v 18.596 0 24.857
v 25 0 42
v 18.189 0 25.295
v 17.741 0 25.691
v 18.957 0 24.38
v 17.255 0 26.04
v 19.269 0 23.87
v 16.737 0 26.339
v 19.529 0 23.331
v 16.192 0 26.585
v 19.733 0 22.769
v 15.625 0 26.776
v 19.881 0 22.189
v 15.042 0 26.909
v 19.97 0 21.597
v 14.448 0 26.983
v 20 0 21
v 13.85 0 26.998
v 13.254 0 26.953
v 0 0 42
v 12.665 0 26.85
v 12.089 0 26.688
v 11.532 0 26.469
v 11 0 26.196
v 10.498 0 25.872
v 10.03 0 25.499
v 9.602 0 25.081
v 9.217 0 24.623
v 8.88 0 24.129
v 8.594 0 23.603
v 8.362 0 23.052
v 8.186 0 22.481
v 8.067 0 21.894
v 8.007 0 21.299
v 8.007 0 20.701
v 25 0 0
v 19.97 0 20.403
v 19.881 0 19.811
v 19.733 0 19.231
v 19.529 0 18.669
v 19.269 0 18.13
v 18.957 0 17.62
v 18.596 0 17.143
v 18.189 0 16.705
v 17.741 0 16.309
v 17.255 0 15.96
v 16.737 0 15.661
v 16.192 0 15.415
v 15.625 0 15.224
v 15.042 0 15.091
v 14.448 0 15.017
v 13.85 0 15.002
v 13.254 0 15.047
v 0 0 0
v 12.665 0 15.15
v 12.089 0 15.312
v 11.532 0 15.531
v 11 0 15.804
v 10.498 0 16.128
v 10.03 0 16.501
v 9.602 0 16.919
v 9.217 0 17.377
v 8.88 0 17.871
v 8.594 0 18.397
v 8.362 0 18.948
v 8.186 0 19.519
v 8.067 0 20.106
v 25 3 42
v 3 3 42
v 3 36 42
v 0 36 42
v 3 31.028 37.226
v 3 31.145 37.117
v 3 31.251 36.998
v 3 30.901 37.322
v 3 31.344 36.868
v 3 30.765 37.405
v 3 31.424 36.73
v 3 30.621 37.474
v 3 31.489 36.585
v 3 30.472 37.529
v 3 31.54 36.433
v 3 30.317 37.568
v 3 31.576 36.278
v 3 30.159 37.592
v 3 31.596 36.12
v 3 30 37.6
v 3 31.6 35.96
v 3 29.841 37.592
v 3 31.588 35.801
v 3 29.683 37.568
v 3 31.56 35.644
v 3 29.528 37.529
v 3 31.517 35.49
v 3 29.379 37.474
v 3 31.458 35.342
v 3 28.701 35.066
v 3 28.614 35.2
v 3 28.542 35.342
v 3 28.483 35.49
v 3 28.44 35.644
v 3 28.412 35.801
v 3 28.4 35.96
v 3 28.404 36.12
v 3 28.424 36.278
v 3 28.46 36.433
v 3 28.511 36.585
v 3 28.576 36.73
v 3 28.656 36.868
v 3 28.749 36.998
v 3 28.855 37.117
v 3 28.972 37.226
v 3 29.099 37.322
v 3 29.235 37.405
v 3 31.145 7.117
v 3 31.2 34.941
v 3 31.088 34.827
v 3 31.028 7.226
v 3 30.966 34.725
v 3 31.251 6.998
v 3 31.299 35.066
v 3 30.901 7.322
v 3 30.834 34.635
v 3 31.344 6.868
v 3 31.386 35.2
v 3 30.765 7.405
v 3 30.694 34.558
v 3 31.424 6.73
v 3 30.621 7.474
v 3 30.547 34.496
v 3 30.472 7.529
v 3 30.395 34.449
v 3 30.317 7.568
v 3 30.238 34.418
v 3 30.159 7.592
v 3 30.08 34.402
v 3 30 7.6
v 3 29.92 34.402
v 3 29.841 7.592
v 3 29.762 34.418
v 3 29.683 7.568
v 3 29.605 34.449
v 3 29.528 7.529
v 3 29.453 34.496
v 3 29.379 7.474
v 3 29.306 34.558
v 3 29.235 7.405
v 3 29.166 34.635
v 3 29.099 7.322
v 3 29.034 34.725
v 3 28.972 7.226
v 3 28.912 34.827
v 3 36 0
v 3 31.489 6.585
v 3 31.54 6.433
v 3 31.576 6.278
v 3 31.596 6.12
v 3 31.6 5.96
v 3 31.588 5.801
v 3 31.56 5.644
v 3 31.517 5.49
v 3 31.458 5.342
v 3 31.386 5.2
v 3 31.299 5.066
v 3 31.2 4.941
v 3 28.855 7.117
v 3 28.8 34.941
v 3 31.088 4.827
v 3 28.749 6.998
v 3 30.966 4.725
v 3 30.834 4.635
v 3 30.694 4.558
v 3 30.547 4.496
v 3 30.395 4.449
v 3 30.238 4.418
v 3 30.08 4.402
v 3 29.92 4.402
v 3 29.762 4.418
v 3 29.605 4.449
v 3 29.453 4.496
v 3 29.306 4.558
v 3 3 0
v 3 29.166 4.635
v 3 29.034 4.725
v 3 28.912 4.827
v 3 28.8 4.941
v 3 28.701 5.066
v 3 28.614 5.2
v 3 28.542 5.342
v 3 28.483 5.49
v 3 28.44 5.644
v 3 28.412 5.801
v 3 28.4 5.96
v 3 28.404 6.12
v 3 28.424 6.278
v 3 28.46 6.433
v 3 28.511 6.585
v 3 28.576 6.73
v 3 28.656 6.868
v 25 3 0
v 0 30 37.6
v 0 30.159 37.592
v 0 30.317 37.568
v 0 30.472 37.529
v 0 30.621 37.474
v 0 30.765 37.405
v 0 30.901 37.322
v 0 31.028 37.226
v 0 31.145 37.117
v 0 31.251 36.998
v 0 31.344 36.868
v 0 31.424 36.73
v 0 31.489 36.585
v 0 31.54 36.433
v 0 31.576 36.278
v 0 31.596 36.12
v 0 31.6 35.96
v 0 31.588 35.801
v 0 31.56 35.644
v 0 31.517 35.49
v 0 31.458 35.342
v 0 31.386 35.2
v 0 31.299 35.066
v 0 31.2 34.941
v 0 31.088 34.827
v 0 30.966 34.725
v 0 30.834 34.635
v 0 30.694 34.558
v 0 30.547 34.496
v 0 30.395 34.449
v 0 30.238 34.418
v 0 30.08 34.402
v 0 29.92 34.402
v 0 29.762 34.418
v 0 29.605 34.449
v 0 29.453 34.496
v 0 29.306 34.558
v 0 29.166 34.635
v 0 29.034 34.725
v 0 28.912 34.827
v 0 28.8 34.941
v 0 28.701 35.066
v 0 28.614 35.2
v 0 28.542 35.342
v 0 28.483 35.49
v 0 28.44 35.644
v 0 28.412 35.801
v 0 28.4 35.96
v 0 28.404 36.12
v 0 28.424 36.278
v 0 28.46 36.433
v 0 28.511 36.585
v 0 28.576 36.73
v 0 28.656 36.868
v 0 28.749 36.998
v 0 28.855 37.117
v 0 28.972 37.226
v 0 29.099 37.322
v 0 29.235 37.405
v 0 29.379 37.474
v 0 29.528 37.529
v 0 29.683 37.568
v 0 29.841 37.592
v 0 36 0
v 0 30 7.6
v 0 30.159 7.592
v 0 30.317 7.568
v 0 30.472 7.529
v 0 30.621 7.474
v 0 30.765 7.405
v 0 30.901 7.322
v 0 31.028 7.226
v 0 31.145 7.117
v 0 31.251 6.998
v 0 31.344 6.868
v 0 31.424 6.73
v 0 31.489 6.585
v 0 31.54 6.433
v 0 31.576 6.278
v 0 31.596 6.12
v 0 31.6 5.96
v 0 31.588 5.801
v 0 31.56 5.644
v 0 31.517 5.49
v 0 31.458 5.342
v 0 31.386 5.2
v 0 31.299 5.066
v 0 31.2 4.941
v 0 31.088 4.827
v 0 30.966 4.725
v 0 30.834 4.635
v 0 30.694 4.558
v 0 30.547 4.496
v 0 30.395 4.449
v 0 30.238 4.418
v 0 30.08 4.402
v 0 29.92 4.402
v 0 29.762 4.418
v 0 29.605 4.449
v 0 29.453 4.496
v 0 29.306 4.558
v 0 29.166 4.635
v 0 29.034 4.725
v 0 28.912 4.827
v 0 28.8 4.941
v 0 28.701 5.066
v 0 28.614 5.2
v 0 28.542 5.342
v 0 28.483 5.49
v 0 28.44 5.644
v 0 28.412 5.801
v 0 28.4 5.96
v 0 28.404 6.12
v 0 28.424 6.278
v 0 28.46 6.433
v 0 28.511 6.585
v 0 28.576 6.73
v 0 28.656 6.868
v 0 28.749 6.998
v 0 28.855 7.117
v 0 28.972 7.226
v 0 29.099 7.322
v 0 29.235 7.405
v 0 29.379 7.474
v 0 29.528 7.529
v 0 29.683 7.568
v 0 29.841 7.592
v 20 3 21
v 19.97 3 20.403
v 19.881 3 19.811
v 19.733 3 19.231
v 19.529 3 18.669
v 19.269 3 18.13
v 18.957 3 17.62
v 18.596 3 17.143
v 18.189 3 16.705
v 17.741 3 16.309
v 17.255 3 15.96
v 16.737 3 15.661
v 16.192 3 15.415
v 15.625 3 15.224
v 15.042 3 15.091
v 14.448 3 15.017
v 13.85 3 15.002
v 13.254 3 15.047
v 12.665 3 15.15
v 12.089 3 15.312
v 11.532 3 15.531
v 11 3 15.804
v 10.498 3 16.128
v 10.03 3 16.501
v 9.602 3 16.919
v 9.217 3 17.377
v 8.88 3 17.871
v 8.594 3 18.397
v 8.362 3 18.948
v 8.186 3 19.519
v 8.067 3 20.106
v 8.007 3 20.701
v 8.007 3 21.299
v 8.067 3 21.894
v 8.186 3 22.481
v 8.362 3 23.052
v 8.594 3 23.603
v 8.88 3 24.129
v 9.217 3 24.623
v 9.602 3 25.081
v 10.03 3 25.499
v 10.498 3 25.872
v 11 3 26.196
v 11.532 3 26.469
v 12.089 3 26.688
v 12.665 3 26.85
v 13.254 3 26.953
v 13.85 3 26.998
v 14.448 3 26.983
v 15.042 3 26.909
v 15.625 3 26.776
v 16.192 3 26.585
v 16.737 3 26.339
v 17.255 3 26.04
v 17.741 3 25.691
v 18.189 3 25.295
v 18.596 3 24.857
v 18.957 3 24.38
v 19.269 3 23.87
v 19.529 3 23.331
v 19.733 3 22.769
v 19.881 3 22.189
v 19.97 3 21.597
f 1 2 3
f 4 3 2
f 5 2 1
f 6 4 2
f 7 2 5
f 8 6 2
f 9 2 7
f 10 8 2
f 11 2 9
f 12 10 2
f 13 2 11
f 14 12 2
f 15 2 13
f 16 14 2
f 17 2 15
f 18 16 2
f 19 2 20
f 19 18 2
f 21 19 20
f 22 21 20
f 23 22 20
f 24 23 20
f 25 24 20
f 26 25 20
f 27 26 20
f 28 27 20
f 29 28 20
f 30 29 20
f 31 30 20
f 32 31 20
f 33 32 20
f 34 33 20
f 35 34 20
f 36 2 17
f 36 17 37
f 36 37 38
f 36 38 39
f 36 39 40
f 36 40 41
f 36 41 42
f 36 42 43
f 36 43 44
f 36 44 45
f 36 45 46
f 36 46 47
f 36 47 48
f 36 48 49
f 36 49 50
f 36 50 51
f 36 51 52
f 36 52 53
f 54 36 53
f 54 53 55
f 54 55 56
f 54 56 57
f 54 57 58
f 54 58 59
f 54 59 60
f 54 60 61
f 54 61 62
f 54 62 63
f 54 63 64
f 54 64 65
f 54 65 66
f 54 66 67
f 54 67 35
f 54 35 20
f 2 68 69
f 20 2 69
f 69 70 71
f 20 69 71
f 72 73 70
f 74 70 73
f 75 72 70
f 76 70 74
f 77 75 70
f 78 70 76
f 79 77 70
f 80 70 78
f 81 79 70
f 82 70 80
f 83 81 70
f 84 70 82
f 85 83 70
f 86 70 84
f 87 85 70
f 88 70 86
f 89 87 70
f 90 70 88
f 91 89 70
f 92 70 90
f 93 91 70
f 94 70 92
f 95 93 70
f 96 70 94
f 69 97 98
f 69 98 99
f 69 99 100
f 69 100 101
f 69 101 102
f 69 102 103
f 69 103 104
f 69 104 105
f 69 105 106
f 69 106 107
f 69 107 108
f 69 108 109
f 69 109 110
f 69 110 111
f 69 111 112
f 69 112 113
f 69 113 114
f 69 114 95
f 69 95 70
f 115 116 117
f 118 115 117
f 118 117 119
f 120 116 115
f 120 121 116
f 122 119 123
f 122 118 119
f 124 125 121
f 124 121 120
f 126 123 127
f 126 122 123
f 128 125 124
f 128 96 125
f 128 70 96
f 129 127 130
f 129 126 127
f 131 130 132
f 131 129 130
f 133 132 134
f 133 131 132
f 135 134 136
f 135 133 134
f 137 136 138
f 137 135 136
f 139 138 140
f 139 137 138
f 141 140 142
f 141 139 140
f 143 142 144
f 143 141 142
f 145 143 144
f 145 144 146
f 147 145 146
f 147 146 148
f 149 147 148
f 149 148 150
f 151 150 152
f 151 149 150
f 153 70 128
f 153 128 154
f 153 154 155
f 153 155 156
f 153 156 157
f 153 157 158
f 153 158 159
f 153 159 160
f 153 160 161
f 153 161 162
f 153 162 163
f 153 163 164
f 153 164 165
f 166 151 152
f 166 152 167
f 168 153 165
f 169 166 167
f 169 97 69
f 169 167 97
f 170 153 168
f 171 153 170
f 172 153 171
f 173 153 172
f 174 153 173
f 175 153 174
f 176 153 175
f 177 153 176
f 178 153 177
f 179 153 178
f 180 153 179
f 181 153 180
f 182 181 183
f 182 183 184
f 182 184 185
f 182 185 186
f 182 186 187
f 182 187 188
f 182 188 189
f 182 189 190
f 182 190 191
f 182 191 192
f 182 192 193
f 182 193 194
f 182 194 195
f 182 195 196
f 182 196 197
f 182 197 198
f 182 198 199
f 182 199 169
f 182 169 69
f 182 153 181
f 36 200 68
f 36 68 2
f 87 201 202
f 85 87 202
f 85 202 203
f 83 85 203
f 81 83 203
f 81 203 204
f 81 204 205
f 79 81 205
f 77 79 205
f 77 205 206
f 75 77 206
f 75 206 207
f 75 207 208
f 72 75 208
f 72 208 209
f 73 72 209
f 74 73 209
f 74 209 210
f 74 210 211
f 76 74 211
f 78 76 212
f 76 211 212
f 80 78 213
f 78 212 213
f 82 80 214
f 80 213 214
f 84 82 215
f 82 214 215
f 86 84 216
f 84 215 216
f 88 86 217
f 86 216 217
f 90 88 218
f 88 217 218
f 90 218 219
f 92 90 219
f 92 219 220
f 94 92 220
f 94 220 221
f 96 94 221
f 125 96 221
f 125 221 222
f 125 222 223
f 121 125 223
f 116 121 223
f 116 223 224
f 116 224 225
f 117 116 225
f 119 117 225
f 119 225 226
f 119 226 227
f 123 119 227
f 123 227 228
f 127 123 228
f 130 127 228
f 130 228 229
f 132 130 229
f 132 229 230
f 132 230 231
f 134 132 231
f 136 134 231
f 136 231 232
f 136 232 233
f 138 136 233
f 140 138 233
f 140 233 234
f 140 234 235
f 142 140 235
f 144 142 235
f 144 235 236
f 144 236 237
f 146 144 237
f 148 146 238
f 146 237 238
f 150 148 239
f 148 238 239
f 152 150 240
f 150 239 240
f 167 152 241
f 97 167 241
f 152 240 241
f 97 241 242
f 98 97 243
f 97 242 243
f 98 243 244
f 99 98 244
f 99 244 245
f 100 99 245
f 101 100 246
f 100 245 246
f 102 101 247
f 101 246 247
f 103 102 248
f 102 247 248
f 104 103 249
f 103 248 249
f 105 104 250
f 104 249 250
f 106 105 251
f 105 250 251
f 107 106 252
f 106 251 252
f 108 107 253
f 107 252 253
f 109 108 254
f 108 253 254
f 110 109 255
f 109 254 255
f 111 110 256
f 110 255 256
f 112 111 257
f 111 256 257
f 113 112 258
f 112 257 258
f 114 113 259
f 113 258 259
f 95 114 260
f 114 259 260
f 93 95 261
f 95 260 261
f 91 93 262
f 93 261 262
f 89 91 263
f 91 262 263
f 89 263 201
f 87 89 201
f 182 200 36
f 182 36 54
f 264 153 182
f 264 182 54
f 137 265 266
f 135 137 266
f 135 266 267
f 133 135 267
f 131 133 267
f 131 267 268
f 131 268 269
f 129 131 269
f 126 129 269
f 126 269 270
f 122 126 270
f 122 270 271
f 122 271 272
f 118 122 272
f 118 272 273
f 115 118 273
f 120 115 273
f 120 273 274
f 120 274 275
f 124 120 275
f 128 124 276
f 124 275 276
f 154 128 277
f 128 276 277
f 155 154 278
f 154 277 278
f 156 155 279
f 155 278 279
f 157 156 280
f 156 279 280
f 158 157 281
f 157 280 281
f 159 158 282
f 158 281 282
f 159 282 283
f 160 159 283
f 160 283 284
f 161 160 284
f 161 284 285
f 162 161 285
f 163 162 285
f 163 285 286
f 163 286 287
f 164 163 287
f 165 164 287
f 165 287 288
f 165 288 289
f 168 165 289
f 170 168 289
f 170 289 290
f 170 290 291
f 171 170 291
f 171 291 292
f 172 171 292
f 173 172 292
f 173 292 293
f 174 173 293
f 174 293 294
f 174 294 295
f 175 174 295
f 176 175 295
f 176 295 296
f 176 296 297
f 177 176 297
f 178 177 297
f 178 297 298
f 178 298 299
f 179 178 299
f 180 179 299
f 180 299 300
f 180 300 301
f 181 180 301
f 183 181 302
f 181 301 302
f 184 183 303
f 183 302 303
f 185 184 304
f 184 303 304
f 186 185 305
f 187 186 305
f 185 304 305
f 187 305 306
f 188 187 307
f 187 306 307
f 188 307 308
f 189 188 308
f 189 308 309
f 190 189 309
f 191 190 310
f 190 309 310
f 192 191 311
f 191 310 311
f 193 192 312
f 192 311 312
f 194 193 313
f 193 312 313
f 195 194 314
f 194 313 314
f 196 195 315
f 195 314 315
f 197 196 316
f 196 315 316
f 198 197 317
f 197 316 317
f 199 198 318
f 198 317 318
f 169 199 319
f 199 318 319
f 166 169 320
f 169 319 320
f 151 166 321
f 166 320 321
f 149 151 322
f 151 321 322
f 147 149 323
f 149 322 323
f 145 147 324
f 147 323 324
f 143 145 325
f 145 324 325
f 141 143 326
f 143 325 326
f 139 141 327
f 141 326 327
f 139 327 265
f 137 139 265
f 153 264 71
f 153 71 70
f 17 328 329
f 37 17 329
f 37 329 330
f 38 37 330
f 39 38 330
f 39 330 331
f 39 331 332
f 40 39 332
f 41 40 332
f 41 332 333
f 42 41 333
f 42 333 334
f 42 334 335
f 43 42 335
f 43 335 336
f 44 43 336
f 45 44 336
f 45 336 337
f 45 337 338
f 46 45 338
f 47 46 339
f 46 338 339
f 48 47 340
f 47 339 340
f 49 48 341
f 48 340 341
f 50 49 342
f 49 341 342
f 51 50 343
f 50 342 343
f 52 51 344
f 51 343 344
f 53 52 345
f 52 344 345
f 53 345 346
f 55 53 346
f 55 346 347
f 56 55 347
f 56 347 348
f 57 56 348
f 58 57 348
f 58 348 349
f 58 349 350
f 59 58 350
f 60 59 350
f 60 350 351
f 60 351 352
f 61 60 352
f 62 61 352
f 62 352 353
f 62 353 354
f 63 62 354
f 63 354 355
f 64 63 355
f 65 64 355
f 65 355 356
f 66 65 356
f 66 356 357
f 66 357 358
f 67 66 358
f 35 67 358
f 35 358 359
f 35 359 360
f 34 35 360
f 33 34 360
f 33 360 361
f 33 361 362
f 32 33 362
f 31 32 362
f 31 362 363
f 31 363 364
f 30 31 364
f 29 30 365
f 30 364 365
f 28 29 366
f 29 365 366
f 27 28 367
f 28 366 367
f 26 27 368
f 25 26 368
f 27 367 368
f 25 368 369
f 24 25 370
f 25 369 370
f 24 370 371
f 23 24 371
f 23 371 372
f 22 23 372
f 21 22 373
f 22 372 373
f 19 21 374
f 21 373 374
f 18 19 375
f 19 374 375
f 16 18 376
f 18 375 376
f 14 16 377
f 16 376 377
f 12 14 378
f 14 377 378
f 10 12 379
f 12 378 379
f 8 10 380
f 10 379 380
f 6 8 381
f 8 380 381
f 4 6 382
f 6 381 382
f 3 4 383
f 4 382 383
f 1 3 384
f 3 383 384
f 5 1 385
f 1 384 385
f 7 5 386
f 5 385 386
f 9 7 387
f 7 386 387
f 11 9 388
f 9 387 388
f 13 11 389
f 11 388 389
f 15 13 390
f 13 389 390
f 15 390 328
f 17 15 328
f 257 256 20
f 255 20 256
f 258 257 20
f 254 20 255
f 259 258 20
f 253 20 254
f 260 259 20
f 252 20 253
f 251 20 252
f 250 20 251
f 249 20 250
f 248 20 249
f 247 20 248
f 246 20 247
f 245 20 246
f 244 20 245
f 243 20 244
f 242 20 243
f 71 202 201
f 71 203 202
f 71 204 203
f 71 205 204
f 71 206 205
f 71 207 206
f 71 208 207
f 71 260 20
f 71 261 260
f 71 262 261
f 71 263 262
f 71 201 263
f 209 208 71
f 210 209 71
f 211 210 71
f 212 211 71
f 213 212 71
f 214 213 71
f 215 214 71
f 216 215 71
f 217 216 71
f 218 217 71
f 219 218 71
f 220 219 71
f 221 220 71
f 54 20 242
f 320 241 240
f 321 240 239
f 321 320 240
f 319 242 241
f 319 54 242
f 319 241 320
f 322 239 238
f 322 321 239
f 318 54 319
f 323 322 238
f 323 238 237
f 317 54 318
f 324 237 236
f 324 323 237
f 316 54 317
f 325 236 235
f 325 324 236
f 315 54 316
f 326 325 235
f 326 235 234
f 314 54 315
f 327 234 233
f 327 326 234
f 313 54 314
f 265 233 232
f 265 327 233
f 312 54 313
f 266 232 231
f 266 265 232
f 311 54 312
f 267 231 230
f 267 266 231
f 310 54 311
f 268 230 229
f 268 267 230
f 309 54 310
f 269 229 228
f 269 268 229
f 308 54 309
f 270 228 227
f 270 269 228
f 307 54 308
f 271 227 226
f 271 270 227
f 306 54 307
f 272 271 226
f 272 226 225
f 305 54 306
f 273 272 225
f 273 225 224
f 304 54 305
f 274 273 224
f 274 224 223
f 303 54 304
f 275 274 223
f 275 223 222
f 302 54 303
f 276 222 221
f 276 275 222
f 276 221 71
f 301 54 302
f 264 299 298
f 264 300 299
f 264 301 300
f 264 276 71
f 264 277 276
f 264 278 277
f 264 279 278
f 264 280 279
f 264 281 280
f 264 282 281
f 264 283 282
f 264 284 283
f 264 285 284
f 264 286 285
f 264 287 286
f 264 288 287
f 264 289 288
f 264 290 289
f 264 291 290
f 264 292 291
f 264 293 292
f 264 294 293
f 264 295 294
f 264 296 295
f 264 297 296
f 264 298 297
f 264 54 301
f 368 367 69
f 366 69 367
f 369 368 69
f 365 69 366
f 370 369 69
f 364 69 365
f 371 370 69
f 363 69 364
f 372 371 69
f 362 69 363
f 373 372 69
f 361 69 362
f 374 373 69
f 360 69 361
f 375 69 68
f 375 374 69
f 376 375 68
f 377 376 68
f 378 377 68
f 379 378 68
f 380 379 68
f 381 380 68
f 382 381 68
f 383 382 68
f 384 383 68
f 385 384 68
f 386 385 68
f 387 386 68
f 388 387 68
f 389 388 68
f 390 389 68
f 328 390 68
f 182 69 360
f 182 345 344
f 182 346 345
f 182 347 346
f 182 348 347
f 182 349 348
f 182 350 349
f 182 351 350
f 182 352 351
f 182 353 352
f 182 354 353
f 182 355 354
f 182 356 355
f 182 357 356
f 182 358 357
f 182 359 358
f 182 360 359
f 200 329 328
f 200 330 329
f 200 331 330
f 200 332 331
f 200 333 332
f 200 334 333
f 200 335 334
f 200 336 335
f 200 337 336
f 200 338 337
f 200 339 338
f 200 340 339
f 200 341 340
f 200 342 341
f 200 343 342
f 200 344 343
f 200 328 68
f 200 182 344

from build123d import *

# Parameters (mm, degrees)
EXTRUDE_1_DEPTH     = 42
SKETCH_2_R          = 1.6
CUT_EXTRUDE_1_DEPTH = 26
SKETCH_3_R          = 6
CUT_EXTRUDE_2_DEPTH = 4


with BuildPart() as part:
    # ｽｹｯﾁ1 → ﾎﾞｽ - 押し出し1 (new body)
    with BuildSketch(Plane.XY):
        Polygon((0, 0), (0, 36), (3, 36), (3, 3), (25, 3), (25, 0), align=None)
    extrude(amount=EXTRUDE_1_DEPTH)

    # ｽｹｯﾁ2 → ｶｯﾄ - 押し出し1 (cut, through all)
    with BuildSketch(Plane.ZY):
        with Locations((36, 30)):
            Circle(SKETCH_2_R)
        with Locations((6, 30)):
            Circle(SKETCH_2_R)
    extrude(amount=-CUT_EXTRUDE_1_DEPTH, mode=Mode.SUBTRACT)

    # ｽｹｯﾁ3 → ｶｯﾄ - 押し出し2 (cut, through all)
    with BuildSketch(Plane(origin=(0, 3, 0), x_dir=(1, 0, 0), z_dir=(0, 1, 0))):
        with Locations((14, -21)):
            Circle(SKETCH_3_R)
    extrude(amount=-CUT_EXTRUDE_2_DEPTH, mode=Mode.SUBTRACT)


solid = part.part
